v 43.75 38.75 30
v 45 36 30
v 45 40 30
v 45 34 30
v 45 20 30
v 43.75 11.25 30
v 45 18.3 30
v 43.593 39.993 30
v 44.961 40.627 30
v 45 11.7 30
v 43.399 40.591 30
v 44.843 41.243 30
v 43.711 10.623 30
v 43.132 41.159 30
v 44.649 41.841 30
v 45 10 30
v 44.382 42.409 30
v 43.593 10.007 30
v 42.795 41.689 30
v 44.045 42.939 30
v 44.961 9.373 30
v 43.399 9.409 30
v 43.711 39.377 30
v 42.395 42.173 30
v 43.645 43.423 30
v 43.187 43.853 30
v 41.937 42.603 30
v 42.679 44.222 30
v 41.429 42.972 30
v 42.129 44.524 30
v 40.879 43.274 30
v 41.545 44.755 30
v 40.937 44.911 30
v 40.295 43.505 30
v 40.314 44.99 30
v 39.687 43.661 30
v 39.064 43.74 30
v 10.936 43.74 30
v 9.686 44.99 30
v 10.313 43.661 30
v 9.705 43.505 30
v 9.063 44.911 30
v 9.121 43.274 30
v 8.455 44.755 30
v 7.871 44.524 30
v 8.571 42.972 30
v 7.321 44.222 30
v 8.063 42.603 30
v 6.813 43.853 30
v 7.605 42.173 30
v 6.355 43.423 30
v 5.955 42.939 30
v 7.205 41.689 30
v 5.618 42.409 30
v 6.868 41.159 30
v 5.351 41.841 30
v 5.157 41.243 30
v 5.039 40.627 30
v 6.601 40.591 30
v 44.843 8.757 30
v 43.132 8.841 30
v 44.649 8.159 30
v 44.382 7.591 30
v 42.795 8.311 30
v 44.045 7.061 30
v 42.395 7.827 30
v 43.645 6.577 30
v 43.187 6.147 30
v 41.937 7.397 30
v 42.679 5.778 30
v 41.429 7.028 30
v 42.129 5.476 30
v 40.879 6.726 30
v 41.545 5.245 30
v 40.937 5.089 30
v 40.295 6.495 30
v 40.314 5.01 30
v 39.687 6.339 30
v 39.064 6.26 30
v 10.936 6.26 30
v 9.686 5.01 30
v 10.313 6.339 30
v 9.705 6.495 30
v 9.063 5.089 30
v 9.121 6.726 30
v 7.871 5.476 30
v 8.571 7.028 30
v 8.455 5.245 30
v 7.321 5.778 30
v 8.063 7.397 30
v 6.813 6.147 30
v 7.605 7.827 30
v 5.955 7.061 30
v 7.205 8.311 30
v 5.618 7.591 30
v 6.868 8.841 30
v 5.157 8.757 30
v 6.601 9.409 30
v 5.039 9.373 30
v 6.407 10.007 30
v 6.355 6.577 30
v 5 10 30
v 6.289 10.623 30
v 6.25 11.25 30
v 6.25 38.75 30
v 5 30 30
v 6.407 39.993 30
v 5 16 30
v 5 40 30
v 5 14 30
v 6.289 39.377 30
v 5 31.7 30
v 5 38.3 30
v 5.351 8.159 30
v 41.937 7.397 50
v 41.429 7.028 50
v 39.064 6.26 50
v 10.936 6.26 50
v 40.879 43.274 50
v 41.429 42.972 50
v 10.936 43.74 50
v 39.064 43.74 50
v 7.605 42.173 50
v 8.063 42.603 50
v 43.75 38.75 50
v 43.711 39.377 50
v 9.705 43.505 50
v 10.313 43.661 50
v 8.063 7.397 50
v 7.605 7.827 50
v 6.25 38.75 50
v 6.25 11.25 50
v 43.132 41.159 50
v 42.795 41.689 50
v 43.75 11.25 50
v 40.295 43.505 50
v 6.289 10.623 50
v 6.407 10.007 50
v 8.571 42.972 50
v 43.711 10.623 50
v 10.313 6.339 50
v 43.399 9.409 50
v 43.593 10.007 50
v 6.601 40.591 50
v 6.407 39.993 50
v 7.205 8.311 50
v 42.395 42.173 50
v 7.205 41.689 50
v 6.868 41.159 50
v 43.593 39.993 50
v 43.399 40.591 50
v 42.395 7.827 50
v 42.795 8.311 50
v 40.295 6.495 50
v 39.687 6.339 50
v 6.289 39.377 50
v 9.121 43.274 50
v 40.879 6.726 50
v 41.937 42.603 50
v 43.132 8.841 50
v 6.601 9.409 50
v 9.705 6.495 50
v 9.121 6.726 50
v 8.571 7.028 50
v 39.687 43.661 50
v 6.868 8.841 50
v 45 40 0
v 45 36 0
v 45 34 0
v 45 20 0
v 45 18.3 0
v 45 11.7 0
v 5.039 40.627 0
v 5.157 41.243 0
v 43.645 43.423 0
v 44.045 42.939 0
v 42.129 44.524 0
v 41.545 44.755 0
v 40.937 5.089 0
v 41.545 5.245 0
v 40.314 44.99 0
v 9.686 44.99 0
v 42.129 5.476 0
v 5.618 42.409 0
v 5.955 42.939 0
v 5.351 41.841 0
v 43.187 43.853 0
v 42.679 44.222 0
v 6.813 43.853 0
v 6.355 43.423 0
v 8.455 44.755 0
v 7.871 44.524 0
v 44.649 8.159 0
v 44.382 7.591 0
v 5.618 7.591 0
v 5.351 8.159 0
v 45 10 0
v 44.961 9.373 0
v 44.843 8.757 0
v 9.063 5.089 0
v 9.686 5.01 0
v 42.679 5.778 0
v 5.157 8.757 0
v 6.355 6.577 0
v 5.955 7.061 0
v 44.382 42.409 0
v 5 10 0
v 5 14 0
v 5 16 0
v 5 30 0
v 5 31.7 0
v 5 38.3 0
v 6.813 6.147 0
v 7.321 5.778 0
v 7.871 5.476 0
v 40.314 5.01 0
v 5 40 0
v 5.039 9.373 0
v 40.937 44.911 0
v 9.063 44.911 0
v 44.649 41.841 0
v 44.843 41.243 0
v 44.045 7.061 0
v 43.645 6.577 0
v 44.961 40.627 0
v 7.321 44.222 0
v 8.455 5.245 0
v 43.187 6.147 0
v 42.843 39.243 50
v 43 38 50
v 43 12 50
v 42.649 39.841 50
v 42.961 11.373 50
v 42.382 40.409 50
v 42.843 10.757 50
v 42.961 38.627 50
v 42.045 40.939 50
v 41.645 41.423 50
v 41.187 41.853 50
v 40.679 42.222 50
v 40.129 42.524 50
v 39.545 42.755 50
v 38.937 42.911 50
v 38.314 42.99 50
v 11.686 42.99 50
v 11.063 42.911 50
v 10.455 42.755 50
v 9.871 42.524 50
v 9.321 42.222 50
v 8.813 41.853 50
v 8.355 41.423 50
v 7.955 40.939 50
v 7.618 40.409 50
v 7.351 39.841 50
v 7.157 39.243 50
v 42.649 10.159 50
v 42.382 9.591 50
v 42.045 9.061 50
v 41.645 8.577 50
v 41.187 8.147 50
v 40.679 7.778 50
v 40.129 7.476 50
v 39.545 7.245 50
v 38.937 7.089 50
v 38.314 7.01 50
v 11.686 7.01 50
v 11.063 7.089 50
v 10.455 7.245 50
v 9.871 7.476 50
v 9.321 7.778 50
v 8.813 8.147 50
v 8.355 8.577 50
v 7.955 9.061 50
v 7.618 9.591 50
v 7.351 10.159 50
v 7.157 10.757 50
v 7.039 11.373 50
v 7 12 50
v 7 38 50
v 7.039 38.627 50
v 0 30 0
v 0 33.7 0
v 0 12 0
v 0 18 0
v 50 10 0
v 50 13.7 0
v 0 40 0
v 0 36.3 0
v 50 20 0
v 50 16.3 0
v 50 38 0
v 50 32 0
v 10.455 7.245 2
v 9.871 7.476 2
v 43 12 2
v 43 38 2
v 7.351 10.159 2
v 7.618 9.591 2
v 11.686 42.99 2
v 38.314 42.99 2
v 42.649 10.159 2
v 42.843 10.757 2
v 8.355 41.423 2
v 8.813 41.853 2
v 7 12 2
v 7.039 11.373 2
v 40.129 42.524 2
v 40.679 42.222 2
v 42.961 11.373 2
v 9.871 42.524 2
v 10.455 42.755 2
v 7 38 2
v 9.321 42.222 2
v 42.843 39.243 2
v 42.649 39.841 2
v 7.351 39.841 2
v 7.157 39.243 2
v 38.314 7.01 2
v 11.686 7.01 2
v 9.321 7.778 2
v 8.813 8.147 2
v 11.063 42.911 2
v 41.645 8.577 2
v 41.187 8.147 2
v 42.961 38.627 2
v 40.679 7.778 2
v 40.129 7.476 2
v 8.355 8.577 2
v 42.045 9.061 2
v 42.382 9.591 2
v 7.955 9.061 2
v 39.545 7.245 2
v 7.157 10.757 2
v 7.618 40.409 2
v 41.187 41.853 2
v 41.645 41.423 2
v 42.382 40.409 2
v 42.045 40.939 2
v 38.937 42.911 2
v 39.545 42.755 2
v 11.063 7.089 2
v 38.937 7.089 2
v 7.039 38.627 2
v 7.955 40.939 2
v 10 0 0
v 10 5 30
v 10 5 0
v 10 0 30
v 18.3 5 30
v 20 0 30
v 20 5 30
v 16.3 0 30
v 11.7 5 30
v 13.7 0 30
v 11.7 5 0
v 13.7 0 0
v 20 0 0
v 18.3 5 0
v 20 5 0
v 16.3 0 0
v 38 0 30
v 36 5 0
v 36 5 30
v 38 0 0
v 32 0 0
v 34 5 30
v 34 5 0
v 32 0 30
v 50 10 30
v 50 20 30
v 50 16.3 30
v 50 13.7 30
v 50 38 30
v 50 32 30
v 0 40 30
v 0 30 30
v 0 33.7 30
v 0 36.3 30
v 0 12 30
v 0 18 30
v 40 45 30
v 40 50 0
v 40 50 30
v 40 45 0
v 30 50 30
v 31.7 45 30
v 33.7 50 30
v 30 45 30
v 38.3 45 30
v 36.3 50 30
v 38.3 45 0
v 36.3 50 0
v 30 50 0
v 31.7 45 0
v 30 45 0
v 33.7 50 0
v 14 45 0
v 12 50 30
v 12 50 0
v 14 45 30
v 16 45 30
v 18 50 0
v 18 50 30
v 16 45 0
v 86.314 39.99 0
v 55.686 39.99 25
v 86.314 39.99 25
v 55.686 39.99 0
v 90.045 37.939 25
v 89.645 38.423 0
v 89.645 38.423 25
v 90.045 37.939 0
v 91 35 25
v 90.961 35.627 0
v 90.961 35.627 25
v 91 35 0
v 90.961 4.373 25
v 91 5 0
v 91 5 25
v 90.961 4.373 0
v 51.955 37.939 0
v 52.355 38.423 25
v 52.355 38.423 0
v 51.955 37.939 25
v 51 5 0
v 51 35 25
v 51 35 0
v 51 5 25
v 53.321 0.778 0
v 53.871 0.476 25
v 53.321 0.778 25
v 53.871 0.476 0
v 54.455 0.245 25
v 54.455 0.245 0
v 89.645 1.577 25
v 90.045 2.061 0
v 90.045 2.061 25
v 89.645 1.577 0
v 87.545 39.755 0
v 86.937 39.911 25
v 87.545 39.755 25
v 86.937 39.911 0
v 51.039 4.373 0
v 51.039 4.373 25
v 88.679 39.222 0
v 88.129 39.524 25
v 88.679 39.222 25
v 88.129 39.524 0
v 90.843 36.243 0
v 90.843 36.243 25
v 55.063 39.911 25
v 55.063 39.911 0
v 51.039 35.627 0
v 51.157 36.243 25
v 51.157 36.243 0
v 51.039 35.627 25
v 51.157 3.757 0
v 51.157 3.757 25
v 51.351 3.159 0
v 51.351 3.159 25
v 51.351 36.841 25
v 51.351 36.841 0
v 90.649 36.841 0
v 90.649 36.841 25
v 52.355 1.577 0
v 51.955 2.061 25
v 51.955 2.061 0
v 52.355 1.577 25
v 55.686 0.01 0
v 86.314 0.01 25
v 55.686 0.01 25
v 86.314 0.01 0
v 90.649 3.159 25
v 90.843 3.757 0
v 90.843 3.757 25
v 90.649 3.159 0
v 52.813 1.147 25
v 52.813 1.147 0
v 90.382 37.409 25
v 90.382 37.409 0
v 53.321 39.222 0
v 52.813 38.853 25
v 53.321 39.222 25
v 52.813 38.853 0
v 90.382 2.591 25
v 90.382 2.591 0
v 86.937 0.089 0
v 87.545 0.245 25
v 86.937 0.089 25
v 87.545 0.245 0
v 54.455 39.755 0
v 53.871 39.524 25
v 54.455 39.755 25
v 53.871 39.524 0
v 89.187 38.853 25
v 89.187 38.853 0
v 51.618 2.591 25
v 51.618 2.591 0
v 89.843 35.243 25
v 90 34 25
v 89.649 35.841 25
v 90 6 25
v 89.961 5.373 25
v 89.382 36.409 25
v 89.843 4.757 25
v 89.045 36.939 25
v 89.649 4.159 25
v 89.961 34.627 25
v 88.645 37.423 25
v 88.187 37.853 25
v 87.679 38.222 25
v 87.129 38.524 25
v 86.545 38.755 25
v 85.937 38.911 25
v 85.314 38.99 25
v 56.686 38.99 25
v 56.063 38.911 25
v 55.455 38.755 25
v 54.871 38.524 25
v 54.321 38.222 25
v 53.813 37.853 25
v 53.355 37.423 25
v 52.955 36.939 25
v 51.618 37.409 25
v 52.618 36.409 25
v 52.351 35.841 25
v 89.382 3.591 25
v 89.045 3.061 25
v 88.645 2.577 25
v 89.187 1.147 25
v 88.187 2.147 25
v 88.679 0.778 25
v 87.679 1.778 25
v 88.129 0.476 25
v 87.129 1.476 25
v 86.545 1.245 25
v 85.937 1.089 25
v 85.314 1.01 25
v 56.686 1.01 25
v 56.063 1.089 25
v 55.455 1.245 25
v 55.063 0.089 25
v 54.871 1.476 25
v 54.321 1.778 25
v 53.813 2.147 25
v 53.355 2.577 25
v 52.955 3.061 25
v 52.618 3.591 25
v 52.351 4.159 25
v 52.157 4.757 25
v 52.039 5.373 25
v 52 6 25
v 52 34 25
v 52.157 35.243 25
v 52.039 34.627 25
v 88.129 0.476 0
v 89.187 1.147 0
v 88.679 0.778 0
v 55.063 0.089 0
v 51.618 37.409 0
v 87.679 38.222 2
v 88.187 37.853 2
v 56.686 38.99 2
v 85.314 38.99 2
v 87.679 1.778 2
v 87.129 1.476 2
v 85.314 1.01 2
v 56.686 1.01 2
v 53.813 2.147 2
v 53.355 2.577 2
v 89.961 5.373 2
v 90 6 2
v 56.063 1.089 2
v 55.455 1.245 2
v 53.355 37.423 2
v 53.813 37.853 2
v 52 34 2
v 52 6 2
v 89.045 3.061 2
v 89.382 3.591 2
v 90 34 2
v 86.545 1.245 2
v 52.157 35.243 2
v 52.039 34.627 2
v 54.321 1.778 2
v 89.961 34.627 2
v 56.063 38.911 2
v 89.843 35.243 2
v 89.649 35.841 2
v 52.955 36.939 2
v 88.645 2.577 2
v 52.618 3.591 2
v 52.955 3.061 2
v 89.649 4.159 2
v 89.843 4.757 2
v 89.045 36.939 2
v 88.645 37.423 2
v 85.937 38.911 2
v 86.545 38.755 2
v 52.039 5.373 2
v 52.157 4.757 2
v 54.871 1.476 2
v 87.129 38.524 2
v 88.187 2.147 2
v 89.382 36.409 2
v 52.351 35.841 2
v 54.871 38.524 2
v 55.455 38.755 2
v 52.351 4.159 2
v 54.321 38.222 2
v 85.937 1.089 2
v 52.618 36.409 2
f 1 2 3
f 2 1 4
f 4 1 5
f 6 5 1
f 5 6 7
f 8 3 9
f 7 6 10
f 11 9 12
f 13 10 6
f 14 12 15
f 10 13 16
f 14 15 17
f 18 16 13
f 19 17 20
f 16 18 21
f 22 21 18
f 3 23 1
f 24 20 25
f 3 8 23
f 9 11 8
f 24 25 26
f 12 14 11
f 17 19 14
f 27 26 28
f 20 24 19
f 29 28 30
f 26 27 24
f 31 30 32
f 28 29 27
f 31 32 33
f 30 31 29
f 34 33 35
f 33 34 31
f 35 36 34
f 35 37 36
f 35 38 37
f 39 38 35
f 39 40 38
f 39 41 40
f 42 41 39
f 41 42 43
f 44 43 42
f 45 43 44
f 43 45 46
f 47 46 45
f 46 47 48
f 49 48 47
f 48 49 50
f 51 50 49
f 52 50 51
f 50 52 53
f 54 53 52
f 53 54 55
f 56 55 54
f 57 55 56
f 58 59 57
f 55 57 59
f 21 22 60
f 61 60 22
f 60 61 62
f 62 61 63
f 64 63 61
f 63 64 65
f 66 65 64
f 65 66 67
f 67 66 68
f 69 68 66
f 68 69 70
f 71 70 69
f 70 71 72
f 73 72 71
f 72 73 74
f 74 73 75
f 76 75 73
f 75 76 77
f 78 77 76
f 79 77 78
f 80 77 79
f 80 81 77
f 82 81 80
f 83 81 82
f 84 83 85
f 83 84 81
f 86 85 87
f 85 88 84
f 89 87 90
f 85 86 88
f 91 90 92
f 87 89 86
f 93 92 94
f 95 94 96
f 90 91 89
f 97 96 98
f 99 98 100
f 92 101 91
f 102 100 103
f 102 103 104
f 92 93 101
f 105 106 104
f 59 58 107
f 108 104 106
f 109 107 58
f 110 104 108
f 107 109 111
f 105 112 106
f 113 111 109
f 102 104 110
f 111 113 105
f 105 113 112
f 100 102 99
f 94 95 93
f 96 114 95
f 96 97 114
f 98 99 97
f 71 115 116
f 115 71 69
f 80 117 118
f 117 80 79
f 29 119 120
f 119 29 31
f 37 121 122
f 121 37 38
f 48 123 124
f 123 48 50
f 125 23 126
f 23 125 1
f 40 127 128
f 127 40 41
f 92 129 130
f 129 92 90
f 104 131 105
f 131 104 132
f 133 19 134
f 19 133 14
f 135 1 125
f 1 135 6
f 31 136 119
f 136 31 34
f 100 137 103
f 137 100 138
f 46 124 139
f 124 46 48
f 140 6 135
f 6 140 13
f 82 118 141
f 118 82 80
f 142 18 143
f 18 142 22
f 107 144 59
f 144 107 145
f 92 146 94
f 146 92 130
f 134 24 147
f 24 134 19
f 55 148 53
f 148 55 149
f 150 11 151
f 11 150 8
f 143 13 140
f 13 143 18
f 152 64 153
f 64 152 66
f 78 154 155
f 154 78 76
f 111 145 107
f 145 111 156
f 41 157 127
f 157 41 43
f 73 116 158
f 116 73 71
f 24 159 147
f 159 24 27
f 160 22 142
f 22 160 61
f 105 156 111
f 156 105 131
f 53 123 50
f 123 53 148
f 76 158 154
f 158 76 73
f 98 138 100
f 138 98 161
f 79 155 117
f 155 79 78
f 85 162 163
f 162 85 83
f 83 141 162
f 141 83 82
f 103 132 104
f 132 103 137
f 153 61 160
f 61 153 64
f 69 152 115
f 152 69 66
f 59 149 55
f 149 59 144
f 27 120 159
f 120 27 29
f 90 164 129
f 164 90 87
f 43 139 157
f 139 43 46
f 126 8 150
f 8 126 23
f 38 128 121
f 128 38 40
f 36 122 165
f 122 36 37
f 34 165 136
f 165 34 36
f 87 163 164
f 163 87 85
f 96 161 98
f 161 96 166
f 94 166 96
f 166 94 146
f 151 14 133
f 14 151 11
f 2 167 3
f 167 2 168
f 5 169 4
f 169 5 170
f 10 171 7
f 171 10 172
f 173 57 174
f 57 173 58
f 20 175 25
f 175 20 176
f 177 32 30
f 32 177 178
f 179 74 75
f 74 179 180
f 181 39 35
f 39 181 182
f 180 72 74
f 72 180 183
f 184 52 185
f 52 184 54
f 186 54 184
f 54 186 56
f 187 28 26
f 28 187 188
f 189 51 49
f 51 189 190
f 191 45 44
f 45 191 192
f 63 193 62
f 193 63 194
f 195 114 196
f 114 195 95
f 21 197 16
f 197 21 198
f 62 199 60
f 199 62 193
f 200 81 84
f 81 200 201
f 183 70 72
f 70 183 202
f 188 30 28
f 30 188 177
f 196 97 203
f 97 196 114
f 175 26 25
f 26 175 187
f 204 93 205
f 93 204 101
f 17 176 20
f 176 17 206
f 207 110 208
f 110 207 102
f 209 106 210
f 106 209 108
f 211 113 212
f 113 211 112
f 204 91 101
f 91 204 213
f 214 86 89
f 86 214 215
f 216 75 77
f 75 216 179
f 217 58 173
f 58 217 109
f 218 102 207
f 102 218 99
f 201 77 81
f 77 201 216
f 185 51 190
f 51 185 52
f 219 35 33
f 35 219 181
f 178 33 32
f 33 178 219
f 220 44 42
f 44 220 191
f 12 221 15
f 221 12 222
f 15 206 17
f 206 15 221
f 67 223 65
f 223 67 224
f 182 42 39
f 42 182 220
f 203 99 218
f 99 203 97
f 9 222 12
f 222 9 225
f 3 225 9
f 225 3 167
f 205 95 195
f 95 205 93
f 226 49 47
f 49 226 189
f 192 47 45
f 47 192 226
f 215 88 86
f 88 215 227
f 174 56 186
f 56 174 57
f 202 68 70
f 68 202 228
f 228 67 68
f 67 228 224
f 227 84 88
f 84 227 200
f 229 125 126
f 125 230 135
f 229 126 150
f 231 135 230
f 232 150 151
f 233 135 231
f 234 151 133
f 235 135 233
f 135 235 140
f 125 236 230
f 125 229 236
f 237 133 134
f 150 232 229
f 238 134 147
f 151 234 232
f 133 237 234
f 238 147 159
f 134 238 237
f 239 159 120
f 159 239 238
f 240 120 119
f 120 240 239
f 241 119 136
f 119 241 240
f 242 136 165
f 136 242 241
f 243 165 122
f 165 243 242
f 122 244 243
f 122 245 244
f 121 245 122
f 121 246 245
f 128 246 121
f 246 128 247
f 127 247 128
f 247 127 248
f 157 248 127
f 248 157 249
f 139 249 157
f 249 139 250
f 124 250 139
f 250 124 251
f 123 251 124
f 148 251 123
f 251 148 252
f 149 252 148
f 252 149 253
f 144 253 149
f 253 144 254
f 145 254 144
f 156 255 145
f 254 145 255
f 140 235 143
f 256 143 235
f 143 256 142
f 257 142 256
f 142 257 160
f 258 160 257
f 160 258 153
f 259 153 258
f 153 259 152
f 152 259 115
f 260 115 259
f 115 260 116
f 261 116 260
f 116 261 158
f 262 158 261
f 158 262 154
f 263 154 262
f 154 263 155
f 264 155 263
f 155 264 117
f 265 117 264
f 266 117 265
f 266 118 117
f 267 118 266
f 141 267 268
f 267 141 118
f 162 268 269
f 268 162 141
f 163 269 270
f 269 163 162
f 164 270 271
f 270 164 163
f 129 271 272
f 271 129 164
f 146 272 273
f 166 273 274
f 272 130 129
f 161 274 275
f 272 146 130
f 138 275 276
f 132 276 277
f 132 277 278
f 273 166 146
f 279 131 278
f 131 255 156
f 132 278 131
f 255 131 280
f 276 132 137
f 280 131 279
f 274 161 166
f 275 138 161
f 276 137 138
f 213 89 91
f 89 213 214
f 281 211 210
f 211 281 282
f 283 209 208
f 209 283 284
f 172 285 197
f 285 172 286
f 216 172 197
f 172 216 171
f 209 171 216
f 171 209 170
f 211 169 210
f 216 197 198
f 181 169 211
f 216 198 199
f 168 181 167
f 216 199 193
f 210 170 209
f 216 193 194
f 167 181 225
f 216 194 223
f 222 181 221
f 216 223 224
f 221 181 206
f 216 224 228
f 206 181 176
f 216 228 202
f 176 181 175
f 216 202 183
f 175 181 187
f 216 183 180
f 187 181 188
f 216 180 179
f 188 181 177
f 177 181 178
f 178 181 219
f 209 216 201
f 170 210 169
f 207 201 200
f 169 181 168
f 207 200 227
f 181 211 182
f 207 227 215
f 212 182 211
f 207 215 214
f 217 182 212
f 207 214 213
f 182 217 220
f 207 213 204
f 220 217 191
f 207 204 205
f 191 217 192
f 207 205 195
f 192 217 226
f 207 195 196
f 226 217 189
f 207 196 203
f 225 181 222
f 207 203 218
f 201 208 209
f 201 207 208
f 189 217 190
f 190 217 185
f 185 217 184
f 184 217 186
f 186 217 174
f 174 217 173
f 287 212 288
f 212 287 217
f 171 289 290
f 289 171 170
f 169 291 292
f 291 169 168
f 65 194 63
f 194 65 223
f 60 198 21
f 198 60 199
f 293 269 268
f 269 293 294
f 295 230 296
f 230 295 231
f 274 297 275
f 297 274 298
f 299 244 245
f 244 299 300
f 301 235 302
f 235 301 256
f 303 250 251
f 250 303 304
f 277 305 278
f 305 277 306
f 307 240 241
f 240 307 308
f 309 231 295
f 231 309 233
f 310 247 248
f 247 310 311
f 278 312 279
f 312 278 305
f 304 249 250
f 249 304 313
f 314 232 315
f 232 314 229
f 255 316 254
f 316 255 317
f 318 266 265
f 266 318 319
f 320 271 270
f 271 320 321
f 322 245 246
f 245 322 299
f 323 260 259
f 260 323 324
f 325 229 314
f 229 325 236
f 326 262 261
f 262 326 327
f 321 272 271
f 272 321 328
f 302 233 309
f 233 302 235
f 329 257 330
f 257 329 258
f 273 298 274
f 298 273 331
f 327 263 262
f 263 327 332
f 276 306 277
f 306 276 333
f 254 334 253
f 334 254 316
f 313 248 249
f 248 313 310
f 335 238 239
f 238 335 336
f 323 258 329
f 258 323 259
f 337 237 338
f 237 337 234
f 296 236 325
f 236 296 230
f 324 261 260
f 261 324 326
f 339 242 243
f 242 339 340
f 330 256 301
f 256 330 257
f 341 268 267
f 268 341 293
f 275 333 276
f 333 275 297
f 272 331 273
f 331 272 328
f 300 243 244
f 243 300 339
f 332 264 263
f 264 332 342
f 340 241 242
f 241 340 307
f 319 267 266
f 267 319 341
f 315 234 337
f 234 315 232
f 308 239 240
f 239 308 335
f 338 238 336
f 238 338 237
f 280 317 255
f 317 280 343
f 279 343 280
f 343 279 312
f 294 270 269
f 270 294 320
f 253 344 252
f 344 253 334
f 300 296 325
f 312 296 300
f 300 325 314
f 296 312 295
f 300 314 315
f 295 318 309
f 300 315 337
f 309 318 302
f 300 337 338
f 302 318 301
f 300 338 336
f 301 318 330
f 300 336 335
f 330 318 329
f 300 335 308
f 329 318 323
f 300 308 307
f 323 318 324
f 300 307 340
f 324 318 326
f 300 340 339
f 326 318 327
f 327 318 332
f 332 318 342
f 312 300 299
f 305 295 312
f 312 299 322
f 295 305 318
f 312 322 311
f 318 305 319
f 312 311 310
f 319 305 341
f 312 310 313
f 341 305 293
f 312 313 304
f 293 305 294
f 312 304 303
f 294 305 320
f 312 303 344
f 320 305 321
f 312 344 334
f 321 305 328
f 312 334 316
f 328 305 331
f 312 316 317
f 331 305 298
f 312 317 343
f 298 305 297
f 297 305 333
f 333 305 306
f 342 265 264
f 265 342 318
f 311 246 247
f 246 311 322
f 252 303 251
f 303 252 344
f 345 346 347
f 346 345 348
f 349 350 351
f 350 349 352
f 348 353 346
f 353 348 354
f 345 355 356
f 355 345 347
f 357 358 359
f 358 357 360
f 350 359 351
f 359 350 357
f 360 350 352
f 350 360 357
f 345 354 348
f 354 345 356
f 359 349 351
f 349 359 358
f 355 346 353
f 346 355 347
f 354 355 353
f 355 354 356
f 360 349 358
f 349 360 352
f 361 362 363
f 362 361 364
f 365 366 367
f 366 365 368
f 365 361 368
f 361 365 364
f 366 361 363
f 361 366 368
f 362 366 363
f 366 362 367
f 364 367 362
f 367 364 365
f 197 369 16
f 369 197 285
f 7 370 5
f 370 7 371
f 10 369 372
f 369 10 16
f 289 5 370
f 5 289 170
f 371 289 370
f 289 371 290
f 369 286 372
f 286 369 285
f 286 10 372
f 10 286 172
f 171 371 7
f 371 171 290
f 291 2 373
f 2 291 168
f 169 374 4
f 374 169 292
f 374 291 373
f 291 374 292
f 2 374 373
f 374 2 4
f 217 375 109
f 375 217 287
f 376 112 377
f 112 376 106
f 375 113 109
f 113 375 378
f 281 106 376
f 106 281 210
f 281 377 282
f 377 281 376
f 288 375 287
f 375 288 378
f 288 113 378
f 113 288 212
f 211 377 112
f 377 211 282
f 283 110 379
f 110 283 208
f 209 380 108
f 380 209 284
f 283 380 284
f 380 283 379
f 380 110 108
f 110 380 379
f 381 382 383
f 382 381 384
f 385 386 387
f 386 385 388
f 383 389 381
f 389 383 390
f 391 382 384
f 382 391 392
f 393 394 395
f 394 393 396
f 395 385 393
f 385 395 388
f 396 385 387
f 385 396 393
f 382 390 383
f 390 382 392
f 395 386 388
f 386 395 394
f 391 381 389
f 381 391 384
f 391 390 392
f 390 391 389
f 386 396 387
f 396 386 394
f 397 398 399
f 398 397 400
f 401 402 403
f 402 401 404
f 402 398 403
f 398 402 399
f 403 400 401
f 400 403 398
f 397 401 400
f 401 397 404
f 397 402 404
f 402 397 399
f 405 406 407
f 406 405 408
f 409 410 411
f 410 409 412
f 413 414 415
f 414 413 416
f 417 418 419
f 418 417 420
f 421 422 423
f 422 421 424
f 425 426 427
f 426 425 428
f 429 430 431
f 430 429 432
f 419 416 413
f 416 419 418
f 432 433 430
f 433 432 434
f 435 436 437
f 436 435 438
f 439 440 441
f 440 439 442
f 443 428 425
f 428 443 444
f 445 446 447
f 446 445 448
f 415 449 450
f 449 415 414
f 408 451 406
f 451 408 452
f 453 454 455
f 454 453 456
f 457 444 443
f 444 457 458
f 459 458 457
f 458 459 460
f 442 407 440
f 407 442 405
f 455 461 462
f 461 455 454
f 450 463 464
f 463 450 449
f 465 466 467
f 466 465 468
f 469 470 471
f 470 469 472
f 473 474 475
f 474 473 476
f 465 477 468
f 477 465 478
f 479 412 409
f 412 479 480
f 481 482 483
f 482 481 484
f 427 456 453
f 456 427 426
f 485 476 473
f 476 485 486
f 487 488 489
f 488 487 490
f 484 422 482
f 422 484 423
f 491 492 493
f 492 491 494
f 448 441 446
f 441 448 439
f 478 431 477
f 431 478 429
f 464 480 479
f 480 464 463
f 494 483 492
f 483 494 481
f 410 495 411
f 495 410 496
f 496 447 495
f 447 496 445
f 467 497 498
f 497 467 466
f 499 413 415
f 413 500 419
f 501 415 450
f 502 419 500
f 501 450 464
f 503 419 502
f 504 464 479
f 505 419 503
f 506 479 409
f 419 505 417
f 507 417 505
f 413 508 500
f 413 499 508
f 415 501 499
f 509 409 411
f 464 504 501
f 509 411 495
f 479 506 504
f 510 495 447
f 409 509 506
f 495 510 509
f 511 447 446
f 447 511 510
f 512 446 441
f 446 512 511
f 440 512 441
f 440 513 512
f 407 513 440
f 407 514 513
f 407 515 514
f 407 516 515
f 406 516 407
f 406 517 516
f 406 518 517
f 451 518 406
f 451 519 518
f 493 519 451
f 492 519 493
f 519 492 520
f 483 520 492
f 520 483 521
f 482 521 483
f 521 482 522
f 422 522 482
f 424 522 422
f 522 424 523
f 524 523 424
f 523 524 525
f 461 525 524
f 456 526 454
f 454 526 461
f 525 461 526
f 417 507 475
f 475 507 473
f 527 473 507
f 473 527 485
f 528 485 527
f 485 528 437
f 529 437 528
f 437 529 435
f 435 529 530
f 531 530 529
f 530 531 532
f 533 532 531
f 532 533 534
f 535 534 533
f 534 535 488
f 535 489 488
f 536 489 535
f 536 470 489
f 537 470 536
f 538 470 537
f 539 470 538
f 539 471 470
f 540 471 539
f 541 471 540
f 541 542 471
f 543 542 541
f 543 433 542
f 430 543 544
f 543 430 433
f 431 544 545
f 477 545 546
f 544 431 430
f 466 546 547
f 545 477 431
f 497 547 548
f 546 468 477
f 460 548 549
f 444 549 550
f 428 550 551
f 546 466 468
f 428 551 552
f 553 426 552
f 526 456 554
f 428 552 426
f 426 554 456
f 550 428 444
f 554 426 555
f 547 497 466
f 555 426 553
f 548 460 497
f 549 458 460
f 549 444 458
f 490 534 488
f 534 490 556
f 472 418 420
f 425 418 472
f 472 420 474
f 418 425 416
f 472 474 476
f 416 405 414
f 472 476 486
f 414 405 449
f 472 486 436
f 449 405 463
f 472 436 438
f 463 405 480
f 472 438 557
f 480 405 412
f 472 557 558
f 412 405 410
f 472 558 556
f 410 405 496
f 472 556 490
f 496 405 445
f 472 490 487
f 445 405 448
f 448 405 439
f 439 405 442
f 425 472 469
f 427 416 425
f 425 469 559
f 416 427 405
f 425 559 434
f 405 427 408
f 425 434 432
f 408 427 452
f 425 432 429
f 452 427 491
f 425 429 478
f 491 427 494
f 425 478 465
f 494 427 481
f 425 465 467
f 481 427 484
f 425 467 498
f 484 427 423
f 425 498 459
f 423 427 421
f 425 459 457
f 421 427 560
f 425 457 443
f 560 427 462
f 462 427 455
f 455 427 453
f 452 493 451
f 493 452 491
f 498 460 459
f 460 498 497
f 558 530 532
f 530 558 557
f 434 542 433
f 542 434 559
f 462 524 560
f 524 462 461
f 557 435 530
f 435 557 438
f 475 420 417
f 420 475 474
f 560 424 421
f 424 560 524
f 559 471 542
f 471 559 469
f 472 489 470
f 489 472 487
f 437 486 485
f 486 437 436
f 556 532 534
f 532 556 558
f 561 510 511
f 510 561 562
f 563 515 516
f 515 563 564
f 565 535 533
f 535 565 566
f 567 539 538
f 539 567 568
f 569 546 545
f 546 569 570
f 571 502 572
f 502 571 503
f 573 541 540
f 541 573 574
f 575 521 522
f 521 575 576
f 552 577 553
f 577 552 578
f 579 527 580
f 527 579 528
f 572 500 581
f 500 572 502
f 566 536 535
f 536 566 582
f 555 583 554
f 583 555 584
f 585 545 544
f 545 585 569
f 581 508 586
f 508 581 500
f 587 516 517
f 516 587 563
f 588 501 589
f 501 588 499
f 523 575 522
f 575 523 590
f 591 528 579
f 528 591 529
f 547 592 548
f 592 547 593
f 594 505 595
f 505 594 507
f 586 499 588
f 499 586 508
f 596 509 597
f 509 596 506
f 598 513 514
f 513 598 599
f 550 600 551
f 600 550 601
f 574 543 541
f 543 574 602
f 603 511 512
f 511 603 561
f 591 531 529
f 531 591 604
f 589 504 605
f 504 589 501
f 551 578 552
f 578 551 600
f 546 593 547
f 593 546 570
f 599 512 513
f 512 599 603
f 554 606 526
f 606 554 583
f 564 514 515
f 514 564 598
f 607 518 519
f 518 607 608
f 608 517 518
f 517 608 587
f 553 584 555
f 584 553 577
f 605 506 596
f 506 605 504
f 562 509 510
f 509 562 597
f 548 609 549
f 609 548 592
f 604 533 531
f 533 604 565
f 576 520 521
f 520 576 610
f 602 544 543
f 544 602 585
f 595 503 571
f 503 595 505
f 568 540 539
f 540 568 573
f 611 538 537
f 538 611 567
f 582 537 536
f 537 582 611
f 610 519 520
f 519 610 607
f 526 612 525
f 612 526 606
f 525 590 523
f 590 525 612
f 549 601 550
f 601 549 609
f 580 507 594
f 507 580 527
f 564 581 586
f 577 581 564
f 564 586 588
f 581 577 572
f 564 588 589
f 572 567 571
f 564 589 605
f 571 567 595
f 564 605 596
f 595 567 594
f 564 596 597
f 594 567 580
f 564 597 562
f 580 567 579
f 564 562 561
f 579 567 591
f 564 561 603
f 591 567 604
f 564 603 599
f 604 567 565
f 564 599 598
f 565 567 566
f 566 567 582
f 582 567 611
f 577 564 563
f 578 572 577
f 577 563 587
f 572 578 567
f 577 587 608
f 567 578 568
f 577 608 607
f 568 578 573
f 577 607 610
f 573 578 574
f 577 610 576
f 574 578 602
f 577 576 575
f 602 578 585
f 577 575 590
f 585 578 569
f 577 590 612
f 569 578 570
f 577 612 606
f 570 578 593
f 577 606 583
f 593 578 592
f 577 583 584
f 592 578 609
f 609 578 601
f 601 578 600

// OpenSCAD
/* [Configurations] */
Object_Height = 50; // [50:200]
Object_Size = 50; // [50: 50mm, 100: 100mm, 150: 150mm, 200: 200mm]
Object_Type = 3; // [1: Box, 2: cover, 3: all]
Cover_Height = 25;
Wall_Tickness = 2;// 5mm is good enough

/* [hidden] */
$fn = 50;
Cover_Spacing = 0.5;
Rounded_Corner = 5;
Connector_Tickness = 2;
Connector_Width = 10;
Connector_Depth = 5;
Object_Side = Object_Size - Connector_Depth * 2;
Border_Width = Connector_Width * 0.5 + Connector_Depth;
Total_Width = Connector_Depth * 2 + Object_Side;

print();

module print() {
    if  (Object_Type == 1) {
        caixa();
    }
    if  (Object_Type == 2) {
        translate([Connector_Depth ,Object_Side + Connector_Depth,Cover_Height]) rotate([180,0,0]) tampa(0);
    }
    if  (Object_Type == 3) {
        caixa();
        translate([Total_Width + 1,Object_Side,Cover_Height]) rotate([180,0,0]) tampa(0);
    }
}

module caixa(){
    translate([Connector_Depth, Connector_Depth, 0])
    difference(){
        roundedcube(Object_Side, Object_Side, Object_Height, Rounded_Corner,Rounded_Corner,Rounded_Corner,Rounded_Corner);
        translate([Wall_Tickness, Wall_Tickness, Wall_Tickness]) roundedcube(Object_Side - Wall_Tickness * 2, Object_Side - Wall_Tickness * 2, Object_Height + 1,Rounded_Corner, Rounded_Corner, Rounded_Corner, Rounded_Corner);
    // Recorte da tampa
        translate([0,-0,(Object_Height + 1) - Cover_Height + (Wall_Tickness * 2)]) tampa(Cover_Spacing);    
    }
    allConnectors();
}

module tampa(folga){
    difference(){
    translate([-folga/2,-folga/2,0]) roundedcube(Object_Side + folga, Object_Side + folga, Cover_Height, Rounded_Corner,Rounded_Corner,Rounded_Corner,Rounded_Corner);
    translate([(Wall_Tickness + folga)/2, (Wall_Tickness + folga) /2, -Wall_Tickness]) roundedcube(Object_Side - Wall_Tickness - folga, Object_Side - Wall_Tickness - folga, Cover_Height , Rounded_Corner, Rounded_Corner, Rounded_Corner, Rounded_Corner);
    }
}

module roundedcube(xdim ,ydim ,zdim,rdim1, rdim2, rdim3, rdim4){
    hull(){
        translate([rdim1,rdim1,0]) cylinder(r=rdim1, h=zdim);
        translate([xdim-rdim2,rdim2,0]) cylinder(r=rdim2, h=zdim);

        translate([rdim3,ydim-rdim3,0]) cylinder(r=rdim3, h=zdim);
        translate([xdim-rdim4,ydim-rdim4,0]) cylinder(r=rdim4, h=zdim);
    }
}

module mConnector() {
    linear_extrude((Object_Height + 1) - Cover_Height + (Wall_Tickness * 2))
    polygon(
        points = [
            [-Connector_Width / 2+ Connector_Tickness, 0],
            [Connector_Width / 2 - Connector_Tickness, 0],
            [Connector_Tickness / 2, Connector_Depth],
            [-Connector_Tickness / 2, Connector_Depth]
        ], center = true);
}

module fConnector() {
    difference() {
        cube([Connector_Width, Connector_Depth, (Object_Height + 1) - Cover_Height + (Wall_Tickness * 2)]);
        translate([Connector_Width / 2, 0, 0])
        scale(1.1)
        mConnector();
    }
}

module sideConnectors(pairs) {
    for (i = [0:pairs - 1]) {
        translate([Border_Width + Connector_Width + 50 * i, Connector_Depth, 0])
        rotate([0, 0, 180])
        fConnector();
        space_connectors = 10;
        translate([Border_Width + Connector_Width * 1.5 + space_connectors + 50 * i, 0, 0])
        mConnector();
    }
    
}

function pairQtt() =
    (Object_Size == 50) ? 1 :
        (Object_Size == 100) ? 2 :
            (Object_Size == 150) ? 3 : 4;

module allConnectors() {
    
    pairs = pairQtt();
    
    sideConnectors(pairs);
    translate([50 * pairs, 0, 0]) rotate([0, 0 , 90])
    sideConnectors(pairs);
    translate([0, 50 * pairs, 0]) rotate([0, 0 , -90])
    sideConnectors(pairs);
    translate([50  * pairs, 50  * pairs, 0]) rotate([0, 0 , 180])
    sideConnectors(pairs);
}
